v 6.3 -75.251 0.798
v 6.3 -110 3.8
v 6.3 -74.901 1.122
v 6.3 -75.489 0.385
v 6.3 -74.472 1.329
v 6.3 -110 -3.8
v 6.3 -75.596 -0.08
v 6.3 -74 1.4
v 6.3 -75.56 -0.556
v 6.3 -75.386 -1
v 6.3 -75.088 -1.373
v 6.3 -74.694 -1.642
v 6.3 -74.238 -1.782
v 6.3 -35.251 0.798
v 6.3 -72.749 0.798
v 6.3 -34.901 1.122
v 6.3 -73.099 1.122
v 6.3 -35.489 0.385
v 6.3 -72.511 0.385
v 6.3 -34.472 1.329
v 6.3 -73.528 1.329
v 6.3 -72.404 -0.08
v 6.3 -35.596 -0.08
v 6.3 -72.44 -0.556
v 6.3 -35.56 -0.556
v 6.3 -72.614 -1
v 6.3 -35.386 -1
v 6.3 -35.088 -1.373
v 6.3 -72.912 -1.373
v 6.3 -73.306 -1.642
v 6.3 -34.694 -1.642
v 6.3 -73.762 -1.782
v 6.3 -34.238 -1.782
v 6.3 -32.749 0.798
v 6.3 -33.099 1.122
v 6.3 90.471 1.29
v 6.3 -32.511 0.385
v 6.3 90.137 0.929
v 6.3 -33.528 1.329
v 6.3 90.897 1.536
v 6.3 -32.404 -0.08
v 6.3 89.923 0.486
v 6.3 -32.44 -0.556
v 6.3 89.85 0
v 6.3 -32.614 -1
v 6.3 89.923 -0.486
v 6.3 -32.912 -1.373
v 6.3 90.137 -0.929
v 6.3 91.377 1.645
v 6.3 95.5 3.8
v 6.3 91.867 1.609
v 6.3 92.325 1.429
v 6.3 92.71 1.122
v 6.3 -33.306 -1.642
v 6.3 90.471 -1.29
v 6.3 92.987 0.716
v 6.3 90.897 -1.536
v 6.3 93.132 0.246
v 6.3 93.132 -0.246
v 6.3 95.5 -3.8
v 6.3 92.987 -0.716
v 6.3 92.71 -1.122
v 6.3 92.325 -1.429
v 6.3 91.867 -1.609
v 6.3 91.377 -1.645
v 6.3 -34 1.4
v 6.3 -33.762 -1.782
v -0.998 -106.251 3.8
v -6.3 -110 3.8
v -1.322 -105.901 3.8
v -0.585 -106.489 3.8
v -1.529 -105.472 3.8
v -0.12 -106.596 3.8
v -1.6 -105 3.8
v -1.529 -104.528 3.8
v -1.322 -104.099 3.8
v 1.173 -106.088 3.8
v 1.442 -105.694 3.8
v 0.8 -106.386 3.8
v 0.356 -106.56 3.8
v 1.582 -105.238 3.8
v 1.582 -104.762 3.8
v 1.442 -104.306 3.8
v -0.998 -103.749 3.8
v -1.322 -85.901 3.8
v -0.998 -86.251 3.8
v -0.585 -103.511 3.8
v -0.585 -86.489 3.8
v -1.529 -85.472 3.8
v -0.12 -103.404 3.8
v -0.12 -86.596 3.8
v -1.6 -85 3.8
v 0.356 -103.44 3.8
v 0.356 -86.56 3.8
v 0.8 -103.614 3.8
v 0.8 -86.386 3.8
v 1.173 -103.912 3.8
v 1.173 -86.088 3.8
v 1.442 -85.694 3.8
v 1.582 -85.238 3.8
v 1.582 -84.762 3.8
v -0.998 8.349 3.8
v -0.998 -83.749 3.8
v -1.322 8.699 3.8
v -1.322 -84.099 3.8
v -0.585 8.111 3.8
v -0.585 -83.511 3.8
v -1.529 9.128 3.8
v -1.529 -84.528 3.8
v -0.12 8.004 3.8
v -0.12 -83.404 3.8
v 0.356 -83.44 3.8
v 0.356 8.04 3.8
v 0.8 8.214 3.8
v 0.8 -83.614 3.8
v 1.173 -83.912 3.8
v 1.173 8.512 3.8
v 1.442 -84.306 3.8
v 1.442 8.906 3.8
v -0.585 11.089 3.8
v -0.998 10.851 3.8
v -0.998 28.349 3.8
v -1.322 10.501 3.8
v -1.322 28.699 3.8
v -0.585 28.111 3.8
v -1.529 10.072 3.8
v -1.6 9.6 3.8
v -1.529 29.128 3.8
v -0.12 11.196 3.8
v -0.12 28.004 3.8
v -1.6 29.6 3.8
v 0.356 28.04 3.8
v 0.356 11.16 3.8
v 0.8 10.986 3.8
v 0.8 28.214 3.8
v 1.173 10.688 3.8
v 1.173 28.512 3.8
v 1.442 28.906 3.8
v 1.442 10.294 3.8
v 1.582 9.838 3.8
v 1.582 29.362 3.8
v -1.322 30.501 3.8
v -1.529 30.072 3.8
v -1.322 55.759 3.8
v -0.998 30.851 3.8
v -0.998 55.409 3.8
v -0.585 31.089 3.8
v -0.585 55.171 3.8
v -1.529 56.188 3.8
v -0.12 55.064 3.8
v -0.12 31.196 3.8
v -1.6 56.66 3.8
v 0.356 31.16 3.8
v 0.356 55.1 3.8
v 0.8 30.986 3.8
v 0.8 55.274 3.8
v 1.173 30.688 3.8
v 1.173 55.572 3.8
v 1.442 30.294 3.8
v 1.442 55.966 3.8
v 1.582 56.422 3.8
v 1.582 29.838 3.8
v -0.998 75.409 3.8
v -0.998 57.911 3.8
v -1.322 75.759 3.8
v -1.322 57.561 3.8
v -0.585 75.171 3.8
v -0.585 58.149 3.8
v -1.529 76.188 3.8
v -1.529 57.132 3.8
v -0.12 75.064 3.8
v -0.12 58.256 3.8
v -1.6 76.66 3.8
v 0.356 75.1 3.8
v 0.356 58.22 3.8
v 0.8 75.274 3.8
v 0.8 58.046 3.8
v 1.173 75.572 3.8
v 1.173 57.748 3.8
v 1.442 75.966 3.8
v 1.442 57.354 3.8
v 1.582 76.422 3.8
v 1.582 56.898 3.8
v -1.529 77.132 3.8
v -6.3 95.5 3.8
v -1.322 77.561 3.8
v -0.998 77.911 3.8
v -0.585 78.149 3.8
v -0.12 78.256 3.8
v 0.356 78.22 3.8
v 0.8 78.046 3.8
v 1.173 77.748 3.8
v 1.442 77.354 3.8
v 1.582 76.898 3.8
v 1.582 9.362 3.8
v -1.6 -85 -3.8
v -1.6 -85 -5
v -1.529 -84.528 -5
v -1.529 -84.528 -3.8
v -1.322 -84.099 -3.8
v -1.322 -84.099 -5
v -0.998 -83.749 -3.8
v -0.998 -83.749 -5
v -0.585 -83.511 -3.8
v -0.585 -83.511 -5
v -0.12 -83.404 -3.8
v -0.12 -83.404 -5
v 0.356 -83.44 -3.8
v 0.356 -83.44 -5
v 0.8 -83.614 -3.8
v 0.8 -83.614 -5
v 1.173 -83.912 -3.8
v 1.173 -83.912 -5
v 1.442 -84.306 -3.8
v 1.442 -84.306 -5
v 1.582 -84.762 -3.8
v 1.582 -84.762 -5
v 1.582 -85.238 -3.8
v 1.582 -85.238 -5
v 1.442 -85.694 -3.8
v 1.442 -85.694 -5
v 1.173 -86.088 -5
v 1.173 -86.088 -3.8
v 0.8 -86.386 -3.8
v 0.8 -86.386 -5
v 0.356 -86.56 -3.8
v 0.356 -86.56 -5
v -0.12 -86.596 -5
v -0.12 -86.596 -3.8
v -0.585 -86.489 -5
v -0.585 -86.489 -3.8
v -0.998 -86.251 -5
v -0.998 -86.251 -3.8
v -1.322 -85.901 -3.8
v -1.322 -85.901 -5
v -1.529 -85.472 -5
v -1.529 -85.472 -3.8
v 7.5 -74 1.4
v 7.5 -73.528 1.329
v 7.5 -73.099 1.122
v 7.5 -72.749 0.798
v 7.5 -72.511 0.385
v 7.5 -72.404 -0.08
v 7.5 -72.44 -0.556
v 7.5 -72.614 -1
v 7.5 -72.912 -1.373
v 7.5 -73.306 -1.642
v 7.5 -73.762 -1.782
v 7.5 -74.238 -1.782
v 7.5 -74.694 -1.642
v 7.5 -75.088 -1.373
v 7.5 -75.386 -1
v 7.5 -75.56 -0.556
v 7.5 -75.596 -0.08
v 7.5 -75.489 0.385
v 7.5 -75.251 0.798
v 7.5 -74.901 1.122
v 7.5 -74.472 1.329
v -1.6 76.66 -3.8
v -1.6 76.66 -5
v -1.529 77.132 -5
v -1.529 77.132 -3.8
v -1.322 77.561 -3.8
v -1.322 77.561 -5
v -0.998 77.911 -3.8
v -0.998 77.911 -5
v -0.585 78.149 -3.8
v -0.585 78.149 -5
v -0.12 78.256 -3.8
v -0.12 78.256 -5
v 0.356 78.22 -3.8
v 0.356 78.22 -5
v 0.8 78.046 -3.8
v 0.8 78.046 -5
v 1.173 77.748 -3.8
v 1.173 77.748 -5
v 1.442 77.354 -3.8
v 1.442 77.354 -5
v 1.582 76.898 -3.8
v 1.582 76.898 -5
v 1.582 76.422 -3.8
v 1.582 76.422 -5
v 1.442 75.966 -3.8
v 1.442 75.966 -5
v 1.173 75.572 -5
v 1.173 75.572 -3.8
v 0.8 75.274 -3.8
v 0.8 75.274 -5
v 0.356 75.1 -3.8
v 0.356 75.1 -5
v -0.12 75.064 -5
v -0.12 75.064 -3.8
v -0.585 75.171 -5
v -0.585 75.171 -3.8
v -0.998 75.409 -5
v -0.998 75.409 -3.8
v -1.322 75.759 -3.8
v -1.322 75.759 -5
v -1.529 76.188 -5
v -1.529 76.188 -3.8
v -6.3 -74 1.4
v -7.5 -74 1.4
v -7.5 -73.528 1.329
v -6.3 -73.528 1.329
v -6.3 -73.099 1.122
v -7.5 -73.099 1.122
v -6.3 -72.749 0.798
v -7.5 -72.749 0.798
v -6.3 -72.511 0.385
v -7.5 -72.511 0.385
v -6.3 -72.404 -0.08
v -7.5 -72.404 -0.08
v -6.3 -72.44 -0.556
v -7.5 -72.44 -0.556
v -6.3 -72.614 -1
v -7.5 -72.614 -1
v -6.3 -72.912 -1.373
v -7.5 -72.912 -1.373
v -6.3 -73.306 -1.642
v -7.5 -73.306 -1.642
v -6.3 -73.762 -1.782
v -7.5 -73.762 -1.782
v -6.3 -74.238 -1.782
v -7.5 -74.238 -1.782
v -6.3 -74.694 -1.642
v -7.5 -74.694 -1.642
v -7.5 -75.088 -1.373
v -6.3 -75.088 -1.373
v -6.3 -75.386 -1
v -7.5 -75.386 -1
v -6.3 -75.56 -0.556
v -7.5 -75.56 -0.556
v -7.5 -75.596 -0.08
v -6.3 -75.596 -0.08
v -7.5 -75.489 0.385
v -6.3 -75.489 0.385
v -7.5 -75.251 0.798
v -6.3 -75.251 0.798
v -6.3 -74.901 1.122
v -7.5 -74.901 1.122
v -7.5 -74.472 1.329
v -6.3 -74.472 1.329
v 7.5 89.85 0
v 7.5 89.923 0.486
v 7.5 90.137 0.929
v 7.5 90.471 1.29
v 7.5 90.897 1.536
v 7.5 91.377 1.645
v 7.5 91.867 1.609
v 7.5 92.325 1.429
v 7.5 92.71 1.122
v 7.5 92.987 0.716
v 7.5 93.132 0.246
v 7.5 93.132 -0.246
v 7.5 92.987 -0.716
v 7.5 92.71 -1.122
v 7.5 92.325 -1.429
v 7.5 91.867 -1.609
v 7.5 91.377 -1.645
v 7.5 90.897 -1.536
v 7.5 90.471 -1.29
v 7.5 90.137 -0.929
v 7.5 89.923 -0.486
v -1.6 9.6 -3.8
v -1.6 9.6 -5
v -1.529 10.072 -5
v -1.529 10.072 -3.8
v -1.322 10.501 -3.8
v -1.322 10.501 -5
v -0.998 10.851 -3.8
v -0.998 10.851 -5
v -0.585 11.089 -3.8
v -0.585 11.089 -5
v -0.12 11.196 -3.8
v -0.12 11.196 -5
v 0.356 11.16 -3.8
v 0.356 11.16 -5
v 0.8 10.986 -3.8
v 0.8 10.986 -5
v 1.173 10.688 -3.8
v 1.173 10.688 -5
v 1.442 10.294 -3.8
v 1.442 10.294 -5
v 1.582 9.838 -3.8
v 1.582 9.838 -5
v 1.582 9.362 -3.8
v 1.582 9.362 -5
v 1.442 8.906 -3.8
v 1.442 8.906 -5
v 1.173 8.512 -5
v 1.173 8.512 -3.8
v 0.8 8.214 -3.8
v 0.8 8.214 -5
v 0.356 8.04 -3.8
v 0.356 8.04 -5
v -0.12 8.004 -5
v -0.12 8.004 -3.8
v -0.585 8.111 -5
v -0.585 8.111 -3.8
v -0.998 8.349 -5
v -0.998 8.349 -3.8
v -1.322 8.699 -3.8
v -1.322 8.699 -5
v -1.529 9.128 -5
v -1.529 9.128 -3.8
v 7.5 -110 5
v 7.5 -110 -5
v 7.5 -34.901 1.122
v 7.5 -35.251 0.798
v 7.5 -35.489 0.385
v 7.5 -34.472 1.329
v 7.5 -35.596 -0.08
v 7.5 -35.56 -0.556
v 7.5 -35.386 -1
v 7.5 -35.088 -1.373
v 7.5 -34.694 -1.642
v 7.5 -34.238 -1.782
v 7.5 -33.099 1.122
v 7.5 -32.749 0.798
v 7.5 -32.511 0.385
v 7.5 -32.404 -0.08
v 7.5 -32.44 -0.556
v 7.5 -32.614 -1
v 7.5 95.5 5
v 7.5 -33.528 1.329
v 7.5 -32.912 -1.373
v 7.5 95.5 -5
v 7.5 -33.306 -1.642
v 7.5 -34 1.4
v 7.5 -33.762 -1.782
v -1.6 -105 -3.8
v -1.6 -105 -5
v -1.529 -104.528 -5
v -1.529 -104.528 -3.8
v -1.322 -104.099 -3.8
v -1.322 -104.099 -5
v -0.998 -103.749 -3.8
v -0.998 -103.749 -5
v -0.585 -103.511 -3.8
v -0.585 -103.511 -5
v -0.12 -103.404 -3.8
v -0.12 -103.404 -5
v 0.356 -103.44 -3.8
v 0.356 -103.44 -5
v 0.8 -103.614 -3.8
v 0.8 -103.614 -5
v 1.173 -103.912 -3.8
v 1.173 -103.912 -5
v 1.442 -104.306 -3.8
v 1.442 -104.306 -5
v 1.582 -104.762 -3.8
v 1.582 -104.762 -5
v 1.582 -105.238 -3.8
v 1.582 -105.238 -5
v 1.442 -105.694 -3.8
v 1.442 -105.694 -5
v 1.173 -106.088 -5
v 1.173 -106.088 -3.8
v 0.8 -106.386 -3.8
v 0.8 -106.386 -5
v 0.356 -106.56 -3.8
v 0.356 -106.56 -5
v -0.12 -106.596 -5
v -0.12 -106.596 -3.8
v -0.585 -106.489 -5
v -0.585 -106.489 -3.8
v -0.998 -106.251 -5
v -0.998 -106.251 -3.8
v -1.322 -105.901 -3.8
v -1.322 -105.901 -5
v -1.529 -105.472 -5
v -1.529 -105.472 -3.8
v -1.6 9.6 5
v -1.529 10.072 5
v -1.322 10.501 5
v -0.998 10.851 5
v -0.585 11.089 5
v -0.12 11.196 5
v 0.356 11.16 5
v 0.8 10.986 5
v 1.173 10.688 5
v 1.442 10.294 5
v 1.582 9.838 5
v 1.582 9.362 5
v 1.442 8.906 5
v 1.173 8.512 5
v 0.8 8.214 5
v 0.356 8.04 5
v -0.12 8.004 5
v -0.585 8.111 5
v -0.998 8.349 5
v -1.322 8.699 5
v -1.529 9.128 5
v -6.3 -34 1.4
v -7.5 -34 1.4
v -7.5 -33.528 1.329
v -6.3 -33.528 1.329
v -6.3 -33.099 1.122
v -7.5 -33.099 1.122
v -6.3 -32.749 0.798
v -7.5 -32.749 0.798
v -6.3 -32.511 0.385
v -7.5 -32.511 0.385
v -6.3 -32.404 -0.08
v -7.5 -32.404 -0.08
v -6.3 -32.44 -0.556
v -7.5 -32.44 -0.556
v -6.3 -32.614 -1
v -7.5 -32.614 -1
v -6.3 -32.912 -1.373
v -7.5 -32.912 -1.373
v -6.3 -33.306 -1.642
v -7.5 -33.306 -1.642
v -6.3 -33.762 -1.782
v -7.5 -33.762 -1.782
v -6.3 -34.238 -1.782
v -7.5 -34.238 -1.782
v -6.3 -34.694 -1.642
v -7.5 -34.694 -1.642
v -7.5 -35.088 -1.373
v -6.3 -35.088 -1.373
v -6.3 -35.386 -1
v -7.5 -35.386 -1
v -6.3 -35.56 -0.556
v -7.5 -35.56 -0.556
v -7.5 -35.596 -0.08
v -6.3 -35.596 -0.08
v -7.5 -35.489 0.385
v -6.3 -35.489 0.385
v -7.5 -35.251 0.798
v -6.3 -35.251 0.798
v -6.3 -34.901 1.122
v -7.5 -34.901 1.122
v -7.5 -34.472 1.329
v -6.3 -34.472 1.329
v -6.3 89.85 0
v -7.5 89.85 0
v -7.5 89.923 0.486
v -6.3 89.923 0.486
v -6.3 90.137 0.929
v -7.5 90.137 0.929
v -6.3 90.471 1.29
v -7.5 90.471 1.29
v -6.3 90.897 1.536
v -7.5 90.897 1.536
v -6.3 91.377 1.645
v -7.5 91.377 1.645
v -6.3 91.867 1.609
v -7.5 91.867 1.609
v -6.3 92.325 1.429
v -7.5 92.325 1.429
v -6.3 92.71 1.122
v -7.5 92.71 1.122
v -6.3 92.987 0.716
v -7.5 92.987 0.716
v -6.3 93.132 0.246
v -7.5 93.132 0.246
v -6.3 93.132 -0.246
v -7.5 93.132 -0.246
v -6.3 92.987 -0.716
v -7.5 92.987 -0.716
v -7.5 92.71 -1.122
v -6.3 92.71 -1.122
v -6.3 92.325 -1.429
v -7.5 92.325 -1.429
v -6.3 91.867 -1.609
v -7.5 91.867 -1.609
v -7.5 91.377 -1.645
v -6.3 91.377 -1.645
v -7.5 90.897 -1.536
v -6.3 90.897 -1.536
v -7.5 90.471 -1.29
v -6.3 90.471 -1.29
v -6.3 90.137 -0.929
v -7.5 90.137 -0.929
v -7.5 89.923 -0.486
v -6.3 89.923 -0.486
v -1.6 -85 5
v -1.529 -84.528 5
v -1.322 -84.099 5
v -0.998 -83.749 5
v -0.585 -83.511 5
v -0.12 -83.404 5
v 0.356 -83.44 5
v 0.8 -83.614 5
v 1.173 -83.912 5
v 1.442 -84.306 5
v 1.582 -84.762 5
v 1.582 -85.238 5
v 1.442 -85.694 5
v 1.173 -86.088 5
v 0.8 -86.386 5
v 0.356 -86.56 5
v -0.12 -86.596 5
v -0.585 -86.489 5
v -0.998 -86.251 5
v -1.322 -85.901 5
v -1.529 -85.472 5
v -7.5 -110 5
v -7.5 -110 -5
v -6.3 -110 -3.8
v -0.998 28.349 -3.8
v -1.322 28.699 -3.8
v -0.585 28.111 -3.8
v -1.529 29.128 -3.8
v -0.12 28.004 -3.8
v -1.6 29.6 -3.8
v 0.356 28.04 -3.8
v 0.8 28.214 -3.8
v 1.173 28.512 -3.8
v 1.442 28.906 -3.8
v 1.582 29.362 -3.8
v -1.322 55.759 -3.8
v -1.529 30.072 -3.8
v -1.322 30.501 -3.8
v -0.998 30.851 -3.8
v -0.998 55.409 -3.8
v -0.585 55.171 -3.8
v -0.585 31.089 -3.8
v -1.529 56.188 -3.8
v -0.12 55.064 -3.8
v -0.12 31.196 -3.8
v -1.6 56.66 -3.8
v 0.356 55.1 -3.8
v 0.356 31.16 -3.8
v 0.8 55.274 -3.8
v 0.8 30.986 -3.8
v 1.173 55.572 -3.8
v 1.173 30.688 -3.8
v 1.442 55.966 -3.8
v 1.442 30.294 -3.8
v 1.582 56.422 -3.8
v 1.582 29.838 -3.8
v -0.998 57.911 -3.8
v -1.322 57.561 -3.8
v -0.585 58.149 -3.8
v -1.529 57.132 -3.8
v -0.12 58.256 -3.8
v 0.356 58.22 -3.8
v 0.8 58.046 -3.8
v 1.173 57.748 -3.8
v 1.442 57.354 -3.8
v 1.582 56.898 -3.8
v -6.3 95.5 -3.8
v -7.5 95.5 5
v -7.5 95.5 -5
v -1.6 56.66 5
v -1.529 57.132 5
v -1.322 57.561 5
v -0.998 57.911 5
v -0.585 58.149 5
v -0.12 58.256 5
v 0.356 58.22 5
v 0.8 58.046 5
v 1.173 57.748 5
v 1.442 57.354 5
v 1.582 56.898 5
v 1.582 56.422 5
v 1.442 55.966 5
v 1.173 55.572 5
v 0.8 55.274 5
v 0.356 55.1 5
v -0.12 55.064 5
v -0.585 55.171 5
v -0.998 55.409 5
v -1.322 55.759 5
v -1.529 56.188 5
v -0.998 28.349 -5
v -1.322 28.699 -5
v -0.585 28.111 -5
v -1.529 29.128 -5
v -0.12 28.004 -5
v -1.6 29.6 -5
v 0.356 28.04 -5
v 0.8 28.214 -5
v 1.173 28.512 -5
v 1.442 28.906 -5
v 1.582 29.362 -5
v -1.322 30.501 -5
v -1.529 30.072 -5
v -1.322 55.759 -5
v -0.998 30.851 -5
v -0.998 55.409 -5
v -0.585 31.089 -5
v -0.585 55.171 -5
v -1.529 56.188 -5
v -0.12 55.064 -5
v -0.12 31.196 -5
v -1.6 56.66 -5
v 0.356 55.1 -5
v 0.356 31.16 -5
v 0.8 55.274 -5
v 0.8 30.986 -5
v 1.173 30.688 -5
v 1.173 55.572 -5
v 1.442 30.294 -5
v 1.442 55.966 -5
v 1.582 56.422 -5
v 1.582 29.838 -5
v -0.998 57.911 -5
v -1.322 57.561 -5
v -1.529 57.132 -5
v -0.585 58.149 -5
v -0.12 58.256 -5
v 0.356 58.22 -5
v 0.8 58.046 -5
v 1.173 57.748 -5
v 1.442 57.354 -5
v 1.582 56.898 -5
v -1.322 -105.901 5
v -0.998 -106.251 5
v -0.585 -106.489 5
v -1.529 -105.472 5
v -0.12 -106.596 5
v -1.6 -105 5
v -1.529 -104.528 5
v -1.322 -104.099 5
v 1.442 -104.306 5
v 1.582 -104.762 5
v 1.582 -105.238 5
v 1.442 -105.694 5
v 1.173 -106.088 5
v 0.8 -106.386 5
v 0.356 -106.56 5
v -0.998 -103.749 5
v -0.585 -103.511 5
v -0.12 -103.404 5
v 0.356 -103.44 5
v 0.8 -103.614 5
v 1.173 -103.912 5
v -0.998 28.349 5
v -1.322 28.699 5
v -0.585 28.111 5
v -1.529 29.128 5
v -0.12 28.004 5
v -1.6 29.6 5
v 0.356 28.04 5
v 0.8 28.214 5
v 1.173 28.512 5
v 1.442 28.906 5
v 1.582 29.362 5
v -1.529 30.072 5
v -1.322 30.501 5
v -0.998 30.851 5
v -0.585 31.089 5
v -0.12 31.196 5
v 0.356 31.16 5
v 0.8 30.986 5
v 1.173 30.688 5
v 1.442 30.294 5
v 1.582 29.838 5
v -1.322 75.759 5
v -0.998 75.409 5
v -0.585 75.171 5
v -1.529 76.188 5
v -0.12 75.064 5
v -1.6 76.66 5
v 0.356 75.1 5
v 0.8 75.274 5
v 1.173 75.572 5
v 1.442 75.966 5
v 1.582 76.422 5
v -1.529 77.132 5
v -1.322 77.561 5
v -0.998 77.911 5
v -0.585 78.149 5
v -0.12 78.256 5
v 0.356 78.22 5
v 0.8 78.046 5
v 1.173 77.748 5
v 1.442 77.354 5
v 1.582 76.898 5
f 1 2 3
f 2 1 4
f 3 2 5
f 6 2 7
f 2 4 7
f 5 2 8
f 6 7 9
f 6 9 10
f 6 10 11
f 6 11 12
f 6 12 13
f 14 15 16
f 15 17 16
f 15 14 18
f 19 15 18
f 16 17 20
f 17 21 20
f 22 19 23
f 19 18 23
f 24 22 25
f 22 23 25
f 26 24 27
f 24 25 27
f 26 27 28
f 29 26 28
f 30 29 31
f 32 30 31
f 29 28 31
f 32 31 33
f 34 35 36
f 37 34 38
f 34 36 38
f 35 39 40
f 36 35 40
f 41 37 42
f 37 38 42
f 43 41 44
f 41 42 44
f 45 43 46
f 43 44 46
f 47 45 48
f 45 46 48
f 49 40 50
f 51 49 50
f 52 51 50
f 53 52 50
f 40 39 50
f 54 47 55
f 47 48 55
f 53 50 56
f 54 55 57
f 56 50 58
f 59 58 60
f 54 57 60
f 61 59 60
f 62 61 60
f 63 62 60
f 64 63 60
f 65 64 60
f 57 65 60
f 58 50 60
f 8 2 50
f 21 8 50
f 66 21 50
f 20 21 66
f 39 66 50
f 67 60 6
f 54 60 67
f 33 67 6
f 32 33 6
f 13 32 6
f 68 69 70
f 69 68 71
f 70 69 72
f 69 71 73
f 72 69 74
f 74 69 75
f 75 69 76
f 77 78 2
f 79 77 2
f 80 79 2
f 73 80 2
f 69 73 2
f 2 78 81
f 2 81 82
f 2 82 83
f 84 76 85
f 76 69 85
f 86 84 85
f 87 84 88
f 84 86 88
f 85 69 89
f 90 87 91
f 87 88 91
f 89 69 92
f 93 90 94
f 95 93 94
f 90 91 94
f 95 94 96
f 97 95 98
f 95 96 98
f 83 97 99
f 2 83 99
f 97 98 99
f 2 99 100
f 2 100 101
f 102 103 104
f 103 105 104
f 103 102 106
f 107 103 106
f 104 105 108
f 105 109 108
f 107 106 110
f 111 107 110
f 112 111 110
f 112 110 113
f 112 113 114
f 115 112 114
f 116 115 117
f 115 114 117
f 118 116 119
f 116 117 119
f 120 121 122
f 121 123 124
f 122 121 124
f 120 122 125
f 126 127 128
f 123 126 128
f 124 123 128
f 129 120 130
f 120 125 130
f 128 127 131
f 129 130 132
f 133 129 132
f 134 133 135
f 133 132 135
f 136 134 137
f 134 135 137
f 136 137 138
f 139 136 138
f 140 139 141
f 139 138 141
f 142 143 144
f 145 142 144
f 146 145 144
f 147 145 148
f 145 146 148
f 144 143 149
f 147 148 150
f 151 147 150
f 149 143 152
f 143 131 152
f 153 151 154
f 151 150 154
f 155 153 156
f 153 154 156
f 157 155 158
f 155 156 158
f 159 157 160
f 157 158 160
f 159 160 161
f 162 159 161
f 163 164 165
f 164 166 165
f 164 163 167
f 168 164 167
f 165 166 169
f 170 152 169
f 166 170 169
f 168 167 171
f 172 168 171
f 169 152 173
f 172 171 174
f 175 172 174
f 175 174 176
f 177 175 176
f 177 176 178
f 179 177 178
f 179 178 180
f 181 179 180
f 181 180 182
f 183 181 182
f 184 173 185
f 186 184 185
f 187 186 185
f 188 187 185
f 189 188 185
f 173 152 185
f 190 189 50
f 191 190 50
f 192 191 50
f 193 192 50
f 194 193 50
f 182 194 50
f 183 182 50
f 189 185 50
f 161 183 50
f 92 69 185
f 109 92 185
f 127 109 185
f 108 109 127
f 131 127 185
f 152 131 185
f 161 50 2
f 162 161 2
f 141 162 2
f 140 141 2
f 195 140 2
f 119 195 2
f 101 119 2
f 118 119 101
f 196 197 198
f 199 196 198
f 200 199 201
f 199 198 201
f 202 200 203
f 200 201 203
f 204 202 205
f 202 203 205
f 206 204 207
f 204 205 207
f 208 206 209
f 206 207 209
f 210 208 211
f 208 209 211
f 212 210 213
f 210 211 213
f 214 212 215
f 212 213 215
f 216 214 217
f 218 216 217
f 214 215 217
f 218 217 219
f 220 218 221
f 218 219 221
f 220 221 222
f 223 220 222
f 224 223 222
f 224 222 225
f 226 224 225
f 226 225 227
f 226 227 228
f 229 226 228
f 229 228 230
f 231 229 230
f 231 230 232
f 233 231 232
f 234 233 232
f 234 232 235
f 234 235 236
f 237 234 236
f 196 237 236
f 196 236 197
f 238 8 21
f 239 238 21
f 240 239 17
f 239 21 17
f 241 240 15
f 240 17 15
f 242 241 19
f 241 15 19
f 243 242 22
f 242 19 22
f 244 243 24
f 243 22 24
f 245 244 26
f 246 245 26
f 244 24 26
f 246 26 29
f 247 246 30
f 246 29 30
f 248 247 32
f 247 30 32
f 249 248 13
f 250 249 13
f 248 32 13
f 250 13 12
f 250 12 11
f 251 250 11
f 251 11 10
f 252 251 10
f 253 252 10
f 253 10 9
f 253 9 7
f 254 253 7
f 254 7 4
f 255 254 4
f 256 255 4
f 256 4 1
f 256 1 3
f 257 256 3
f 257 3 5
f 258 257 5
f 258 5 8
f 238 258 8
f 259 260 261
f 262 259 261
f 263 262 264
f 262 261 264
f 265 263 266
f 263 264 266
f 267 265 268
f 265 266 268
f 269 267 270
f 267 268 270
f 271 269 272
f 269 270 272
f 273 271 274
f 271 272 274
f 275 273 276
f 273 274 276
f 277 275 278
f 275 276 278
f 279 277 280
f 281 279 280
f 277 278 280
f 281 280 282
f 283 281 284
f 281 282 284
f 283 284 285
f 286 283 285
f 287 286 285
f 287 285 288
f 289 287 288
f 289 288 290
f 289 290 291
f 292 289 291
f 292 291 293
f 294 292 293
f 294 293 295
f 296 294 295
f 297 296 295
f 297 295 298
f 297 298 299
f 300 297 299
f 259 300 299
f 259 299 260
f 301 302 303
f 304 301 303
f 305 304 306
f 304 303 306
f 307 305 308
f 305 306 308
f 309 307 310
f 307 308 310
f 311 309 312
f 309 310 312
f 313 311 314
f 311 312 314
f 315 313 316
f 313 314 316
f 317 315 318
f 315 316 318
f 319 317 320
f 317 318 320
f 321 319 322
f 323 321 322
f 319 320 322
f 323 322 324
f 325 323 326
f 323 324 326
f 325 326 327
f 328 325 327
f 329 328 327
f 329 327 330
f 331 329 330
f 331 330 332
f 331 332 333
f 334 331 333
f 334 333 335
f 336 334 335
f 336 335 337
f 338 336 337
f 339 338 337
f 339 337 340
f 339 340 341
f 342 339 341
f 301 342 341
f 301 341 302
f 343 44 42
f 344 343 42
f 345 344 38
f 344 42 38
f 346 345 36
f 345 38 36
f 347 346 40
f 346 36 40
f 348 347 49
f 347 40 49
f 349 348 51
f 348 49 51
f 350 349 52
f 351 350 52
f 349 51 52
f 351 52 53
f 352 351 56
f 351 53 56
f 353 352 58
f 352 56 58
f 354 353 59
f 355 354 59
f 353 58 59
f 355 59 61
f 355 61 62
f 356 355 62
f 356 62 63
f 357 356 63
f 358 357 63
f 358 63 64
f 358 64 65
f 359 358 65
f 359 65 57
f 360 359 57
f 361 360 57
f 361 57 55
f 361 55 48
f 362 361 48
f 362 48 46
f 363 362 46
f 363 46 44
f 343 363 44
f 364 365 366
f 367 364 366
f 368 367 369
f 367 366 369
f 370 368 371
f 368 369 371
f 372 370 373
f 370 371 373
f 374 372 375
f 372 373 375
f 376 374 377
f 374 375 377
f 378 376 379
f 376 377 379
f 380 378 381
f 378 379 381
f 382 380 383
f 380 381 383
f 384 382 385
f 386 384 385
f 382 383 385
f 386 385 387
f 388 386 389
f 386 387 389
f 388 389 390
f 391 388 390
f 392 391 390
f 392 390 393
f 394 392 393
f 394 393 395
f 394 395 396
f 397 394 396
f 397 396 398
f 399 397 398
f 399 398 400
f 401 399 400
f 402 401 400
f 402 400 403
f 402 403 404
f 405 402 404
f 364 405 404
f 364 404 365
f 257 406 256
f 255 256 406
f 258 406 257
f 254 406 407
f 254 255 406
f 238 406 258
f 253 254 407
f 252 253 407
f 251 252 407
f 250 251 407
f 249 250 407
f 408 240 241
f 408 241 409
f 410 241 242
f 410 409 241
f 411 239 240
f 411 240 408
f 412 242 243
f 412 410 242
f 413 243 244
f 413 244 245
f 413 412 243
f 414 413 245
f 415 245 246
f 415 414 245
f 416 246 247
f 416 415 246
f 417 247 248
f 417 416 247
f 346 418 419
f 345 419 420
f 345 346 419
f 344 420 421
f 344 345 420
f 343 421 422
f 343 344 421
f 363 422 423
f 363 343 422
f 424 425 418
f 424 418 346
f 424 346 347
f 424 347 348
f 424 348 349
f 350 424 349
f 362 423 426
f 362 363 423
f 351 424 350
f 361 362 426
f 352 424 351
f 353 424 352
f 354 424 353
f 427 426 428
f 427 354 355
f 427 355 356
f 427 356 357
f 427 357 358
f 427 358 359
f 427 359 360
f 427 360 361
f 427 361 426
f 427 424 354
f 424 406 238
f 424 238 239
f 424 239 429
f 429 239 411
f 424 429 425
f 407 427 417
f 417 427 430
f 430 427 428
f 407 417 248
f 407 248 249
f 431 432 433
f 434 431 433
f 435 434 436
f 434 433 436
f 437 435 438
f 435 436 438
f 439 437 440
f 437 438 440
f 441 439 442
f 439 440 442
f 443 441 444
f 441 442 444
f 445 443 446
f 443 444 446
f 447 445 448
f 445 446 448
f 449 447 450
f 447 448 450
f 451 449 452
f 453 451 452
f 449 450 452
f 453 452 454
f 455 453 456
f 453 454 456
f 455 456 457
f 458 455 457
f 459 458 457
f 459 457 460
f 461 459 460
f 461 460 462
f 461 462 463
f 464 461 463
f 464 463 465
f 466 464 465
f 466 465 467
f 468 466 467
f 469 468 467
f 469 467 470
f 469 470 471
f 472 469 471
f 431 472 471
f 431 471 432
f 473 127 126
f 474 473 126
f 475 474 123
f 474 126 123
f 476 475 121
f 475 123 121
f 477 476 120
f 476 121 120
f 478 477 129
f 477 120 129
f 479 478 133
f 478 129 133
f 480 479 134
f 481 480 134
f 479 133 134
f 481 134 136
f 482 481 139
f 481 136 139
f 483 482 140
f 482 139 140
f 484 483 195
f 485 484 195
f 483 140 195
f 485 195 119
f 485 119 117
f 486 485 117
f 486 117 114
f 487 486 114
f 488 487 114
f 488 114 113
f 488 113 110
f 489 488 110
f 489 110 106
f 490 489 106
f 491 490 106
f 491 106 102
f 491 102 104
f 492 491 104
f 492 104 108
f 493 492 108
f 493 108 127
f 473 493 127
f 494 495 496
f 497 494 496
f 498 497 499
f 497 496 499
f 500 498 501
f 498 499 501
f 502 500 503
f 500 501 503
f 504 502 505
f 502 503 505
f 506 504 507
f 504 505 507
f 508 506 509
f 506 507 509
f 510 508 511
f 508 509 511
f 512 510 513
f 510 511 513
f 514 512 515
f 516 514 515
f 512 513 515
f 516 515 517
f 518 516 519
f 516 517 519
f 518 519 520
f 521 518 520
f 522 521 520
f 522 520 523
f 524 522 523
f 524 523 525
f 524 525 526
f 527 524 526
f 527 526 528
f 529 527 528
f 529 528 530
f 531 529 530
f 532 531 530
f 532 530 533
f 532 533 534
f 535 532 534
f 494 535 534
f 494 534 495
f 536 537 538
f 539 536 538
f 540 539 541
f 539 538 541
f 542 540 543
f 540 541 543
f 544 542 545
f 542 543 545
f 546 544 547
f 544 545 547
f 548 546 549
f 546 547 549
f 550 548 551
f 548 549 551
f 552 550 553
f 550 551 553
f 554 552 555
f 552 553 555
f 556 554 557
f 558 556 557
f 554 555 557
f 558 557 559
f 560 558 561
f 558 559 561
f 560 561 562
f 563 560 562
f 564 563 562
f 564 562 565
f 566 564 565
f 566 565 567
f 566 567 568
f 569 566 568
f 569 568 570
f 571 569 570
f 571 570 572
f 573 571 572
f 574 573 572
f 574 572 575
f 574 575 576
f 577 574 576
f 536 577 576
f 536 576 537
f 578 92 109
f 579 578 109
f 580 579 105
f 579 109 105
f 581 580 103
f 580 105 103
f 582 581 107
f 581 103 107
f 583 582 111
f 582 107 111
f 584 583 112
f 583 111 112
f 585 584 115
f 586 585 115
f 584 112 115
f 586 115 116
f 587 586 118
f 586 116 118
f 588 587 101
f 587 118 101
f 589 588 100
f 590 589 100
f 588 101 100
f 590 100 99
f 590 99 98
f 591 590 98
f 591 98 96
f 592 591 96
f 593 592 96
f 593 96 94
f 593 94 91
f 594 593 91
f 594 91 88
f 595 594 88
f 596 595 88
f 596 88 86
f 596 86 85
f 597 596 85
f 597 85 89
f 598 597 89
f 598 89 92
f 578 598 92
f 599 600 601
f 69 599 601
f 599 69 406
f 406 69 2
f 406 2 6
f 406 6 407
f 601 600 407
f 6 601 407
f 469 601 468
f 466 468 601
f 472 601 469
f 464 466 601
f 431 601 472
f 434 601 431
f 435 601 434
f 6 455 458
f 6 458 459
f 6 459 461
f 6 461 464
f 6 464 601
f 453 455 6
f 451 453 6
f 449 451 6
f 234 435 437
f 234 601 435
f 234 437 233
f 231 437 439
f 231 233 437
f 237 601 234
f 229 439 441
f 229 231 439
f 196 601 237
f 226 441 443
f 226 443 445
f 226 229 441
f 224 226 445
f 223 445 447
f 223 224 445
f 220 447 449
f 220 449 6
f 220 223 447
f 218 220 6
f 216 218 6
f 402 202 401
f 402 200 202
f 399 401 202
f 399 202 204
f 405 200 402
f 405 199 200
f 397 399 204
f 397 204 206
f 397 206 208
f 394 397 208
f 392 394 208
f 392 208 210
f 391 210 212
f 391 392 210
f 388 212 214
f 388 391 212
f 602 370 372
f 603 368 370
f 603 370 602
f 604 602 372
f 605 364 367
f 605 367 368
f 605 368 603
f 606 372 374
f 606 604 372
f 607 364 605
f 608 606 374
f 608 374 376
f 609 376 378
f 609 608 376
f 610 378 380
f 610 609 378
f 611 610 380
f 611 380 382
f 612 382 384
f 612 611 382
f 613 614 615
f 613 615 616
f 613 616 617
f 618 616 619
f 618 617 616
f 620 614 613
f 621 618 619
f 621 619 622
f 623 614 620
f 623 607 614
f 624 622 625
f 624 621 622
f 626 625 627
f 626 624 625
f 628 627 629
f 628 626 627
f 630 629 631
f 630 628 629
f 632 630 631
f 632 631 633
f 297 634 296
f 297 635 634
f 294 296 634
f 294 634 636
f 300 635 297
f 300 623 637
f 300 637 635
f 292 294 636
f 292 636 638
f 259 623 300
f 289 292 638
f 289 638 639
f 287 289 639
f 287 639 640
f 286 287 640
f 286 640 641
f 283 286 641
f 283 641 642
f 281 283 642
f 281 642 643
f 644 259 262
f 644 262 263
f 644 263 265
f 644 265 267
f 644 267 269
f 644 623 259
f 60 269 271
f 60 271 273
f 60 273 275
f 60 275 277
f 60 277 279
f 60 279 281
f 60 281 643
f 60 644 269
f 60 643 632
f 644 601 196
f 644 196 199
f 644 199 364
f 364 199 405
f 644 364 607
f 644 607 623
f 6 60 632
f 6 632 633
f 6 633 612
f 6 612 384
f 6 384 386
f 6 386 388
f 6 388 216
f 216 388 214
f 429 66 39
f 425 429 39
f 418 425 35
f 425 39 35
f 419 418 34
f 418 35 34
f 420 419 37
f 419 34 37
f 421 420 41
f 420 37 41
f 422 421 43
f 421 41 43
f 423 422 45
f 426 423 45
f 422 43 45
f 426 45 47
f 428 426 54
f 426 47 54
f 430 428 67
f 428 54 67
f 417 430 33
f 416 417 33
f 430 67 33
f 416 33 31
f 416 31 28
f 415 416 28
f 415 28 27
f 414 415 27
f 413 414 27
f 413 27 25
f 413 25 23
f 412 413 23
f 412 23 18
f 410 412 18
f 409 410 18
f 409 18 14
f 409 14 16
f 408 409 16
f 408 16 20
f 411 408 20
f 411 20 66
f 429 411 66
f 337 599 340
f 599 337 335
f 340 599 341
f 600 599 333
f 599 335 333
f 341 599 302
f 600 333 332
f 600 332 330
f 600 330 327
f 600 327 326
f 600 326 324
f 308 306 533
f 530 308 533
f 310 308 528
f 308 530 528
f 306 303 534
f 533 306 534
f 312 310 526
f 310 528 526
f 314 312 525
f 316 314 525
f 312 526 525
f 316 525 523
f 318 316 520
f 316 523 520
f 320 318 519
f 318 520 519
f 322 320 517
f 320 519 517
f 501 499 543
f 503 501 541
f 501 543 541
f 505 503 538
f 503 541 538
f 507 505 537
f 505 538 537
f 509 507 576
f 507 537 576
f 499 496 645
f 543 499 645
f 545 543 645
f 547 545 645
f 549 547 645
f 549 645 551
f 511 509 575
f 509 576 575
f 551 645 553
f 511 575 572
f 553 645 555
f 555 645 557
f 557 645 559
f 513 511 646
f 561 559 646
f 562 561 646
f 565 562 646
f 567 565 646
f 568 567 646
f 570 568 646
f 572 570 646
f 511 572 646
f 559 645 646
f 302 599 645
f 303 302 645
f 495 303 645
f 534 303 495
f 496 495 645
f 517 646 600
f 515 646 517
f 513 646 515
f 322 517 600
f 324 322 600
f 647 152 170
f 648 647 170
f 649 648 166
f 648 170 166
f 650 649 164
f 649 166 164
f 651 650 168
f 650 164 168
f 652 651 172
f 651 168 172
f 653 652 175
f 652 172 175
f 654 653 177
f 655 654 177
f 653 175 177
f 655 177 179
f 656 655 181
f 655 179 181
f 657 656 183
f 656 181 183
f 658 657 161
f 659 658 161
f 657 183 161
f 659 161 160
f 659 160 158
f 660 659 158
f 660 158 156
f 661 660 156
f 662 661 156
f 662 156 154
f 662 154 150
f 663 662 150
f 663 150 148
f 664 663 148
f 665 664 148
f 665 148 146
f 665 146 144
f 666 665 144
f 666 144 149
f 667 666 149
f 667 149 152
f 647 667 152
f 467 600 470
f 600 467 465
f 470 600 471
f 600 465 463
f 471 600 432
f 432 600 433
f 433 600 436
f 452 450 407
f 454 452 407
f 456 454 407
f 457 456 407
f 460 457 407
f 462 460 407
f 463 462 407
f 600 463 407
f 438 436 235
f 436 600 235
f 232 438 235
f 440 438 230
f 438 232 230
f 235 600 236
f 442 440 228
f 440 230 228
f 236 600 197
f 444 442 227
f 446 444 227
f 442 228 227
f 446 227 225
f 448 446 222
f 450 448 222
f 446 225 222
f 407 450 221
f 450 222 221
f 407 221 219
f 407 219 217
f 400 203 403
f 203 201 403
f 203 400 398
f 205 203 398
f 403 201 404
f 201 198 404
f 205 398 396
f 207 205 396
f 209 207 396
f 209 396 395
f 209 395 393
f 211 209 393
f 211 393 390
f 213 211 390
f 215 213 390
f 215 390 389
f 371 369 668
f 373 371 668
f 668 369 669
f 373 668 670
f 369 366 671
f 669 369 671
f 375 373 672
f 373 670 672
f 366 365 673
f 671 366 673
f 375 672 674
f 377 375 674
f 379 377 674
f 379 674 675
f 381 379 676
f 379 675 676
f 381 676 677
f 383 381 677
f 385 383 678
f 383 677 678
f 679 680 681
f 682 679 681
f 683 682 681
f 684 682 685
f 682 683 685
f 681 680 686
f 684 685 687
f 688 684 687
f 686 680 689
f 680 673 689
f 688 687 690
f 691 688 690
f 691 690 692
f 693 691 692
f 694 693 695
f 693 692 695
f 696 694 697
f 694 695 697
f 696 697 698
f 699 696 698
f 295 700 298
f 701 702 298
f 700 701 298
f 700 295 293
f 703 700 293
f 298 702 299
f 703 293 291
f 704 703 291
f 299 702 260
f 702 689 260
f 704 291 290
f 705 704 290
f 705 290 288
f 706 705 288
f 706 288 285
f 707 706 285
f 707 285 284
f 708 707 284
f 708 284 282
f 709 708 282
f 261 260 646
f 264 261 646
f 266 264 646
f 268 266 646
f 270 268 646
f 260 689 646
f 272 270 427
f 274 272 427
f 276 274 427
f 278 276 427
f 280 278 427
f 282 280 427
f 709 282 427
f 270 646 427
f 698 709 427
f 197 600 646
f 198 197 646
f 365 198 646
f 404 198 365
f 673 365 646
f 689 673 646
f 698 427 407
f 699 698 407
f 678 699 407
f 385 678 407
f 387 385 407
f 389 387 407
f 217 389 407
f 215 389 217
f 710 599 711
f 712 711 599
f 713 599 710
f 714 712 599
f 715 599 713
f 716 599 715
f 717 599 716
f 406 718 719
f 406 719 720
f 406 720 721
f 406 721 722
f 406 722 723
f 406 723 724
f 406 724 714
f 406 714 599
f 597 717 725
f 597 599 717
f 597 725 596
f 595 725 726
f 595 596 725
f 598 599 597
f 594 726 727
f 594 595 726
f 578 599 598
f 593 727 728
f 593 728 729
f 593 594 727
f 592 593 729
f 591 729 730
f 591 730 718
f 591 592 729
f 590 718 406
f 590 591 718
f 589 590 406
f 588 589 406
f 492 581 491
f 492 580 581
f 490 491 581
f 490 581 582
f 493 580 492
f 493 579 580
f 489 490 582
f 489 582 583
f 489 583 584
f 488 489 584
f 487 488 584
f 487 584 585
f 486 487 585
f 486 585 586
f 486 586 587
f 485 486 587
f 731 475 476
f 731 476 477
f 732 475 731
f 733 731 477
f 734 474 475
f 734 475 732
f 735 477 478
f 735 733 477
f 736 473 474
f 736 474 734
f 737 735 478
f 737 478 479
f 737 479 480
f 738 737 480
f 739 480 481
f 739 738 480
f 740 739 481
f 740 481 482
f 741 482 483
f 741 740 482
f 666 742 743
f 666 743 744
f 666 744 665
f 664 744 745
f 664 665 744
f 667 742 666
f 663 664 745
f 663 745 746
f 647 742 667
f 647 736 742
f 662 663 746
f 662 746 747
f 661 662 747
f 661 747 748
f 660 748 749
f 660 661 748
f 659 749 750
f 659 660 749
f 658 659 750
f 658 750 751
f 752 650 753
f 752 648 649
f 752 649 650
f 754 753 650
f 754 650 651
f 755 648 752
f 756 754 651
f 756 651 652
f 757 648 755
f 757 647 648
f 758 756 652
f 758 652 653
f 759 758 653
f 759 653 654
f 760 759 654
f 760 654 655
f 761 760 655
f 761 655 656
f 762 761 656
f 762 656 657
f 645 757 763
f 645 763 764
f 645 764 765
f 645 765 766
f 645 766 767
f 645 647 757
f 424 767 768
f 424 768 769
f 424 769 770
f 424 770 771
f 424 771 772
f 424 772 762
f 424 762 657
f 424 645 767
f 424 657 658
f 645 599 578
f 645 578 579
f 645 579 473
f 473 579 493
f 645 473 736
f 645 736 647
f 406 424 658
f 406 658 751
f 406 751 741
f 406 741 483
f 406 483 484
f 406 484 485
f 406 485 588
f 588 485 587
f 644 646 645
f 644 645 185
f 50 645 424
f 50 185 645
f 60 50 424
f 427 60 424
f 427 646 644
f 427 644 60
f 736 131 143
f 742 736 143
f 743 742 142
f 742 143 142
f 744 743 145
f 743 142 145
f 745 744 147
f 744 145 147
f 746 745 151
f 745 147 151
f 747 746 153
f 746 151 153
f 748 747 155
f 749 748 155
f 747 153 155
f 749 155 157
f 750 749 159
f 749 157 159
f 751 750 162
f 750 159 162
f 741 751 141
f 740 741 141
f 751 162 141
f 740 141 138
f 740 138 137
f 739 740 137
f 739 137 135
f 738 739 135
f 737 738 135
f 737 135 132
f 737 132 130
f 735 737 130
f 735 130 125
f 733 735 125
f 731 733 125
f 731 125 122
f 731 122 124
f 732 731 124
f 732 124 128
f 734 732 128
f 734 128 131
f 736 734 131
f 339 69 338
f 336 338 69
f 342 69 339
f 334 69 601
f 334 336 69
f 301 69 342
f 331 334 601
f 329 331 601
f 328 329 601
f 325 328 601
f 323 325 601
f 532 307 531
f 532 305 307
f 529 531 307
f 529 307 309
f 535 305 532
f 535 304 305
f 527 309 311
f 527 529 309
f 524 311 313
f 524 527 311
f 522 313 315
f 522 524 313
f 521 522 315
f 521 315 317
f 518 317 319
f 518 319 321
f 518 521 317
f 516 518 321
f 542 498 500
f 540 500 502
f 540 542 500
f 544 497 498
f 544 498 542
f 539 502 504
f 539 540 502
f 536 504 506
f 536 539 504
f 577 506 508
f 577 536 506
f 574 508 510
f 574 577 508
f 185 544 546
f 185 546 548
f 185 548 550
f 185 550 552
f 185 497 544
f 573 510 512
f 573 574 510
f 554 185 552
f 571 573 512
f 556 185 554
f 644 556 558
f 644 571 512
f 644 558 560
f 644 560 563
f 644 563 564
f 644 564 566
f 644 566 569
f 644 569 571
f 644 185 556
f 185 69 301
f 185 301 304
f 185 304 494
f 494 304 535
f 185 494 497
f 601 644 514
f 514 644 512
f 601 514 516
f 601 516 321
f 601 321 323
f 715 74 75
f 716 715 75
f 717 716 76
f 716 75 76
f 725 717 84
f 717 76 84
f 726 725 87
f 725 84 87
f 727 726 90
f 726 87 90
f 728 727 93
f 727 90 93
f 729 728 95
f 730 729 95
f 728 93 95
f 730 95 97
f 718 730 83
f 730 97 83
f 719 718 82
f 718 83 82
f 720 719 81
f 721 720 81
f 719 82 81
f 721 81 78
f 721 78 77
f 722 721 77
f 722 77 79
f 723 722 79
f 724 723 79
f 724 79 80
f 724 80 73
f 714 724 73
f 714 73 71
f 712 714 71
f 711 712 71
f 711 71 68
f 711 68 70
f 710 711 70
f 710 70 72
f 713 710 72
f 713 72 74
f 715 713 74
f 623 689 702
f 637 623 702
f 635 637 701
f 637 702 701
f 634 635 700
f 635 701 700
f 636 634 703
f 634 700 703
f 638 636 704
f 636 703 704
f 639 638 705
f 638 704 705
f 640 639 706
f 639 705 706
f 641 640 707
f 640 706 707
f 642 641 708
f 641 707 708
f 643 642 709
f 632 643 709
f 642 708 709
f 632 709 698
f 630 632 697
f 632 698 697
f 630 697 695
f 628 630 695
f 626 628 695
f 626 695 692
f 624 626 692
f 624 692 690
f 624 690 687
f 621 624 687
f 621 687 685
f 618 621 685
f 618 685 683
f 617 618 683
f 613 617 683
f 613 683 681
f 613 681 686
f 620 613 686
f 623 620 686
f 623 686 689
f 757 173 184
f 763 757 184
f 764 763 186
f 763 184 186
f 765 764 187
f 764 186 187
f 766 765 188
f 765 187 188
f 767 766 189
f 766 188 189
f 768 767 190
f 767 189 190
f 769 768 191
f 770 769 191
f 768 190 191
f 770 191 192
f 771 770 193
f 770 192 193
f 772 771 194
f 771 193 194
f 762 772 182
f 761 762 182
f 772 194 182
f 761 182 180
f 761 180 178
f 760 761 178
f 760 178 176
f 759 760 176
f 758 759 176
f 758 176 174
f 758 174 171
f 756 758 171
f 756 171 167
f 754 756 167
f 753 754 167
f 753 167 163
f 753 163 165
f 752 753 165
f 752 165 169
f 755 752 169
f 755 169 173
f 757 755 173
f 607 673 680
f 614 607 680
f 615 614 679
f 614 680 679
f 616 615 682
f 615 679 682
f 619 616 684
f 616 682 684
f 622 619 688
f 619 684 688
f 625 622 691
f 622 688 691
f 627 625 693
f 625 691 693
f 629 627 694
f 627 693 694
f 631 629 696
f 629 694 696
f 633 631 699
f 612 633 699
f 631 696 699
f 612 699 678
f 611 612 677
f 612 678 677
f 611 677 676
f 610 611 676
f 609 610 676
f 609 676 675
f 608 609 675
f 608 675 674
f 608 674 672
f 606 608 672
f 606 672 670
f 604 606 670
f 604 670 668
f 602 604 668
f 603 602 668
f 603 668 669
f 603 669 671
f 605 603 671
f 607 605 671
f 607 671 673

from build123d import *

# Parameters (mm, degrees)
SKETCH_1_W          = 15
SKETCH_1_H          = 10
SKETCH_1_W_2        = 12.6
SKETCH_1_H_2        = 7.6
EXTRUDE_1_DEPTH     = 110
SKETCH_2_R          = 1.6
CUT_EXTRUDE_1_DEPTH = 100
SKETCH_3_R          = 1.6
CUT_EXTRUDE_2_DEPTH = 15
SKETCH_5_W          = 15
SKETCH_5_H          = 10
CUT_EXTRUDE_4_DEPTH = 14.5
SKETCH_6_R          = 1.6
CUT_EXTRUDE_5_DEPTH = 15
CUT_EXTRUDE_6_DEPTH = 15
SKETCH_8_R          = 1.6
CUT_EXTRUDE_7_DEPTH = 10


with BuildPart() as part:
    # ｽｹｯﾁ1 → ﾎﾞｽ - 押し出し1 (new, symmetric)
    with BuildSketch(Plane(origin=(0, 0, 0), x_dir=(1, 0, 0), z_dir=(0, 1, 0))):
        Rectangle(SKETCH_1_W, SKETCH_1_H)
        Rectangle(SKETCH_1_W_2, SKETCH_1_H_2, mode=Mode.SUBTRACT)
    extrude(amount=EXTRUDE_1_DEPTH, both=True)

    # ｽｹｯﾁ2 → ｶｯﾄ - 押し出し1 (cut)
    with BuildSketch(Plane(origin=(0, 0, -5), x_dir=(-1, 0, 0), z_dir=(0, 0, -1))):
        with Locations((0, -85)):
            Circle(SKETCH_2_R)
        with Locations((0, -105)):
            Circle(SKETCH_2_R)
    extrude(amount=-CUT_EXTRUDE_1_DEPTH, mode=Mode.SUBTRACT)

    # ｽｹｯﾁ3 → ｶｯﾄ - 押し出し2 (cut)
    with BuildSketch(Plane.ZY.offset(7.5)):
        with Locations((-0.2, -74)):
            Circle(SKETCH_3_R)
        with Locations((-0.2, -34)):
            Circle(SKETCH_3_R)
    extrude(amount=-CUT_EXTRUDE_2_DEPTH, mode=Mode.SUBTRACT)

    # ｽｹｯﾁ5 → ｶｯﾄ - 押し出し4 (cut)
    with BuildSketch(Plane(origin=(0, 110, 0), x_dir=(1, 0, 0), z_dir=(0, 1, 0))):
        Rectangle(SKETCH_5_W, SKETCH_5_H)
    extrude(amount=-CUT_EXTRUDE_4_DEPTH, mode=Mode.SUBTRACT)

    # ｽｹｯﾁ6 → ｶｯﾄ - 押し出し5 (cut)
    with BuildSketch(Plane(origin=(0, 0, -5), x_dir=(-1, 0, 0), z_dir=(0, 0, -1))):
        with Locations((0, 56.66)):
            Circle(SKETCH_6_R)
        with Locations((0, 76.66)):
            Circle(SKETCH_6_R)
    extrude(amount=-CUT_EXTRUDE_5_DEPTH, mode=Mode.SUBTRACT)

    # ｽｹｯﾁ7 → ｶｯﾄ - 押し出し6 (cut)
    with BuildSketch(Plane.ZY.offset(7.5)):
        with BuildLine():
            ThreePointArc((0, 93.15), (-1.65, 91.5), (0, 89.85))
            ThreePointArc((0, 89.85), (1.65, 91.5), (0, 93.15))
        make_face()
    extrude(amount=-CUT_EXTRUDE_6_DEPTH, mode=Mode.SUBTRACT)

    # ｽｹｯﾁ8 → ｶｯﾄ - 押し出し7 (cut)
    with BuildSketch(Plane(origin=(0, 0, -5), x_dir=(-1, 0, 0), z_dir=(0, 0, -1))):
        with Locations((0, 9.6)):
            Circle(SKETCH_8_R)
        with Locations((0, 29.6)):
            Circle(SKETCH_8_R)
    extrude(amount=-CUT_EXTRUDE_7_DEPTH, mode=Mode.SUBTRACT)


solid = part.part
